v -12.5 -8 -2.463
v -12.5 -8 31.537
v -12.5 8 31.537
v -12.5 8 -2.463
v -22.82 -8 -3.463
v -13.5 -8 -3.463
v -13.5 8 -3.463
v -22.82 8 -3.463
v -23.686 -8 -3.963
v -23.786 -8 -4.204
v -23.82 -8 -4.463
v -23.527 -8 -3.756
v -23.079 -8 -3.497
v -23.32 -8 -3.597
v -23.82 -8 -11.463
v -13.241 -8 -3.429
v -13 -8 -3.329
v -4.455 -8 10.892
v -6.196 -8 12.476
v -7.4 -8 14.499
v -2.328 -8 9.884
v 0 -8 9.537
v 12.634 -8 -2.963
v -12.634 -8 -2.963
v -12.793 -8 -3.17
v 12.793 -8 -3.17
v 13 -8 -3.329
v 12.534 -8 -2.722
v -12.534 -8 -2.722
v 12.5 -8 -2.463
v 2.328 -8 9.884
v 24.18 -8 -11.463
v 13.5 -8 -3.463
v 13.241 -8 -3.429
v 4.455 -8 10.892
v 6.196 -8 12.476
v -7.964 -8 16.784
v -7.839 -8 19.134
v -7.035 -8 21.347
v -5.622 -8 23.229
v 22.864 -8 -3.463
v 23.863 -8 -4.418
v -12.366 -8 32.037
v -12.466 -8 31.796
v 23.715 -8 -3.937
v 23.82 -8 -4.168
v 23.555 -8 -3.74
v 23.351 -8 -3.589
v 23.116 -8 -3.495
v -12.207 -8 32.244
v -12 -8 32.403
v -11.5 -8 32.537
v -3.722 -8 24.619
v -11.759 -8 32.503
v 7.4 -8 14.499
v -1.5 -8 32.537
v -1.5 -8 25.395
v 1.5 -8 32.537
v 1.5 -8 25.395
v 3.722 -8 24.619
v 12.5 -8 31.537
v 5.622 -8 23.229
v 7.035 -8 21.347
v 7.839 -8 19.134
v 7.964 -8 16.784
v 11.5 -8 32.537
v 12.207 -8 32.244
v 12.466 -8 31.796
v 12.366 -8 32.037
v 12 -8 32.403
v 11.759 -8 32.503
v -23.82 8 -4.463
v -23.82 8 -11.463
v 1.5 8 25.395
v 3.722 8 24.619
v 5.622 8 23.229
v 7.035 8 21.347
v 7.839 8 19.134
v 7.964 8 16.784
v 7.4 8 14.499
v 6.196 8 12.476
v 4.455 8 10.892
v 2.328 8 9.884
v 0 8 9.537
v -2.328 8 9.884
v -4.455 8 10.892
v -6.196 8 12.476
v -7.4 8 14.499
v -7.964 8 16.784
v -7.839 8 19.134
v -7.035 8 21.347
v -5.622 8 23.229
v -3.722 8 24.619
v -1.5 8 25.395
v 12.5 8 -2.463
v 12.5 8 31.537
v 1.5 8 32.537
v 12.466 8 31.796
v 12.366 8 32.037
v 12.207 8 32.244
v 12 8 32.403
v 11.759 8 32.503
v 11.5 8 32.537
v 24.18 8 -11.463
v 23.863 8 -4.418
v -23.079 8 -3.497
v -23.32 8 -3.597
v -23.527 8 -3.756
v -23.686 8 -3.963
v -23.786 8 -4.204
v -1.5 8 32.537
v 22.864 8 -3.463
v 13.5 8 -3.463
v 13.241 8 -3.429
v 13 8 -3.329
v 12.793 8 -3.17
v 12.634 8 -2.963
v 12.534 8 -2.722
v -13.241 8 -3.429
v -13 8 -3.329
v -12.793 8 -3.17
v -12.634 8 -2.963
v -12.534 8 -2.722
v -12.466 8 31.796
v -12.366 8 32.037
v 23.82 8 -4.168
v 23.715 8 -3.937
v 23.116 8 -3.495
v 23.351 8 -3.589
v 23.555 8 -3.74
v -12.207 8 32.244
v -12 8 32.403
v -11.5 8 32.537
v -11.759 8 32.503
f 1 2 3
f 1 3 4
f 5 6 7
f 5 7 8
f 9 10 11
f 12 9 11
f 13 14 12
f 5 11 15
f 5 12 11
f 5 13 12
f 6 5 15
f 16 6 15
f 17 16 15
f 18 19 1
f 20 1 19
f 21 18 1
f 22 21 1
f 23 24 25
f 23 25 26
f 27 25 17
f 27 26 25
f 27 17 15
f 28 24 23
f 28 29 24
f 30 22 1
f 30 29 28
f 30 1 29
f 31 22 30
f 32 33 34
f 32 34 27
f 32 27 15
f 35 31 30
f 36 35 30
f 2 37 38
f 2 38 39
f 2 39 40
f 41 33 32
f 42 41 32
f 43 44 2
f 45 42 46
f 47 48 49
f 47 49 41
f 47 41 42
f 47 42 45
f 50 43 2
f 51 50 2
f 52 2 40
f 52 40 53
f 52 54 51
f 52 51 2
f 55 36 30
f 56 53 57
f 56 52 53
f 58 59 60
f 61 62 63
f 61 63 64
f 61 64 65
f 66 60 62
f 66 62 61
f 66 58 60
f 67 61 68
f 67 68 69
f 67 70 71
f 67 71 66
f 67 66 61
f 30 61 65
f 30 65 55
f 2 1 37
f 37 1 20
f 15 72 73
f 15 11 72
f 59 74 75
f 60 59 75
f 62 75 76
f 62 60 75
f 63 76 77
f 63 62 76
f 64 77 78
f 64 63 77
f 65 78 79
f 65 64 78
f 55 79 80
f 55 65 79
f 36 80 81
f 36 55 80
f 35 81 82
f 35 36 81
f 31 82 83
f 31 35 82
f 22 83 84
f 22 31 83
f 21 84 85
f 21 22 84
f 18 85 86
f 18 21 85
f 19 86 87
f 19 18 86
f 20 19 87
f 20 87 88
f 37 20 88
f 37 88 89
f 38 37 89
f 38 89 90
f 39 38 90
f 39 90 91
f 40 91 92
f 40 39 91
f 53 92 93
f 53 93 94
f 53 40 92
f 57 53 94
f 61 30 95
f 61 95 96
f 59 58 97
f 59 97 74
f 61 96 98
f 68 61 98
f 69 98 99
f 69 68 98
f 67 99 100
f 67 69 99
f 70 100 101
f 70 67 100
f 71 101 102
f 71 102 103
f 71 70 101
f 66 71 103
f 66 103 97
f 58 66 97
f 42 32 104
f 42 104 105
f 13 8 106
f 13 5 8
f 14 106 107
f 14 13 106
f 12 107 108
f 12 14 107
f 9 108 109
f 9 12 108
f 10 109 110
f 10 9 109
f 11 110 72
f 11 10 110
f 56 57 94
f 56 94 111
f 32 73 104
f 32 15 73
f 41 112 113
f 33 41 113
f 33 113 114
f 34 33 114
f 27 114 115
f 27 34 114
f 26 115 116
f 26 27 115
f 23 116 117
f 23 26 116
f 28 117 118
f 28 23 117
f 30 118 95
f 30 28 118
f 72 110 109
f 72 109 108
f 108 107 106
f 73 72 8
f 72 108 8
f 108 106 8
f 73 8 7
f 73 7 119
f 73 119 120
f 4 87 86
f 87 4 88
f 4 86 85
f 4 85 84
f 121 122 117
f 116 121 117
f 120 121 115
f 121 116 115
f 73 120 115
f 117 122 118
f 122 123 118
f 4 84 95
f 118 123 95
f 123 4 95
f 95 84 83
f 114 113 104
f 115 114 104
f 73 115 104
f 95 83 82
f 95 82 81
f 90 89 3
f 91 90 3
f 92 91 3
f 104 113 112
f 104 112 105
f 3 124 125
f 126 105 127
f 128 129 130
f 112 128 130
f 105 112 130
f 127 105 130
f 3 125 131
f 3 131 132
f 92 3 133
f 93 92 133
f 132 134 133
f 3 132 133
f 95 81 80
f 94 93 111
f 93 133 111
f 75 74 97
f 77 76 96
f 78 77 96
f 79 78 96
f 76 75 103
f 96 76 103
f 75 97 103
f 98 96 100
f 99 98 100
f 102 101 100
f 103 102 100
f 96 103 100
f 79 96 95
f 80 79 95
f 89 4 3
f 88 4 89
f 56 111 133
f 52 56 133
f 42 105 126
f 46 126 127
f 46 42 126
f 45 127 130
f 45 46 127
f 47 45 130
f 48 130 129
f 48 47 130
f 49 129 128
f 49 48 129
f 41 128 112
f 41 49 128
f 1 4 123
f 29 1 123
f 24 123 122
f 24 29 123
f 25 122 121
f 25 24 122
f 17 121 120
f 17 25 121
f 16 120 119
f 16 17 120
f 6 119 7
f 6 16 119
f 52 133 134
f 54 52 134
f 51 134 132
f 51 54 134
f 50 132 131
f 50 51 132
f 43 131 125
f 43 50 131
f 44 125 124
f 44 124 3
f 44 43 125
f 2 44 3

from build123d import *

# Parameters (mm, degrees)
F1_DEPTH = 8


with BuildPart() as f1:
    # F0 (on Front) → F1 (new body, symmetric)
    with BuildSketch(Plane.XZ):
        with BuildLine():
            Line((-23.820377, -11.462722), (24.179623, -11.462722))
            Line((24.179623, -11.462722), (23.863268, -4.417862))
            ThreePointArc((23.863268, -4.417862), (23.555339, -3.739929), (22.864275, -3.462722))
            Line((22.864275, -3.462722), (13.5, -3.462722))
            ThreePointArc((13.5, -3.462722), (12.792893, -3.169829), (12.5, -2.462722))
            Line((12.5, -2.462722), (12.5, 31.537278))
            ThreePointArc((12.5, 31.537278), (12.207107, 32.244384), (11.5, 32.537278))
            Line((11.5, 32.537278), (1.5, 32.537278))
            Line((1.5, 32.537278), (1.5, 25.395395))
            ThreePointArc((1.5, 25.395395), (0, 9.537278), (-1.5, 25.395395))
            Line((-1.5, 25.395395), (-1.5, 32.537278))
            Line((-1.5, 32.537278), (-11.5, 32.537278))
            ThreePointArc((-11.5, 32.537278), (-12.207107, 32.244384), (-12.5, 31.537278))
            Line((-12.5, 31.537278), (-12.5, -2.462722))
            ThreePointArc((-12.5, -2.462722), (-12.792893, -3.169829), (-13.5, -3.462722))
            Line((-13.5, -3.462722), (-22.820377, -3.462722))
            ThreePointArc((-22.820377, -3.462722), (-23.527483, -3.755616), (-23.820377, -4.462722))
            Line((-23.820377, -4.462722), (-23.820377, -11.462722))
        make_face()
    extrude(amount=F1_DEPTH, both=True)


solid = f1.part
